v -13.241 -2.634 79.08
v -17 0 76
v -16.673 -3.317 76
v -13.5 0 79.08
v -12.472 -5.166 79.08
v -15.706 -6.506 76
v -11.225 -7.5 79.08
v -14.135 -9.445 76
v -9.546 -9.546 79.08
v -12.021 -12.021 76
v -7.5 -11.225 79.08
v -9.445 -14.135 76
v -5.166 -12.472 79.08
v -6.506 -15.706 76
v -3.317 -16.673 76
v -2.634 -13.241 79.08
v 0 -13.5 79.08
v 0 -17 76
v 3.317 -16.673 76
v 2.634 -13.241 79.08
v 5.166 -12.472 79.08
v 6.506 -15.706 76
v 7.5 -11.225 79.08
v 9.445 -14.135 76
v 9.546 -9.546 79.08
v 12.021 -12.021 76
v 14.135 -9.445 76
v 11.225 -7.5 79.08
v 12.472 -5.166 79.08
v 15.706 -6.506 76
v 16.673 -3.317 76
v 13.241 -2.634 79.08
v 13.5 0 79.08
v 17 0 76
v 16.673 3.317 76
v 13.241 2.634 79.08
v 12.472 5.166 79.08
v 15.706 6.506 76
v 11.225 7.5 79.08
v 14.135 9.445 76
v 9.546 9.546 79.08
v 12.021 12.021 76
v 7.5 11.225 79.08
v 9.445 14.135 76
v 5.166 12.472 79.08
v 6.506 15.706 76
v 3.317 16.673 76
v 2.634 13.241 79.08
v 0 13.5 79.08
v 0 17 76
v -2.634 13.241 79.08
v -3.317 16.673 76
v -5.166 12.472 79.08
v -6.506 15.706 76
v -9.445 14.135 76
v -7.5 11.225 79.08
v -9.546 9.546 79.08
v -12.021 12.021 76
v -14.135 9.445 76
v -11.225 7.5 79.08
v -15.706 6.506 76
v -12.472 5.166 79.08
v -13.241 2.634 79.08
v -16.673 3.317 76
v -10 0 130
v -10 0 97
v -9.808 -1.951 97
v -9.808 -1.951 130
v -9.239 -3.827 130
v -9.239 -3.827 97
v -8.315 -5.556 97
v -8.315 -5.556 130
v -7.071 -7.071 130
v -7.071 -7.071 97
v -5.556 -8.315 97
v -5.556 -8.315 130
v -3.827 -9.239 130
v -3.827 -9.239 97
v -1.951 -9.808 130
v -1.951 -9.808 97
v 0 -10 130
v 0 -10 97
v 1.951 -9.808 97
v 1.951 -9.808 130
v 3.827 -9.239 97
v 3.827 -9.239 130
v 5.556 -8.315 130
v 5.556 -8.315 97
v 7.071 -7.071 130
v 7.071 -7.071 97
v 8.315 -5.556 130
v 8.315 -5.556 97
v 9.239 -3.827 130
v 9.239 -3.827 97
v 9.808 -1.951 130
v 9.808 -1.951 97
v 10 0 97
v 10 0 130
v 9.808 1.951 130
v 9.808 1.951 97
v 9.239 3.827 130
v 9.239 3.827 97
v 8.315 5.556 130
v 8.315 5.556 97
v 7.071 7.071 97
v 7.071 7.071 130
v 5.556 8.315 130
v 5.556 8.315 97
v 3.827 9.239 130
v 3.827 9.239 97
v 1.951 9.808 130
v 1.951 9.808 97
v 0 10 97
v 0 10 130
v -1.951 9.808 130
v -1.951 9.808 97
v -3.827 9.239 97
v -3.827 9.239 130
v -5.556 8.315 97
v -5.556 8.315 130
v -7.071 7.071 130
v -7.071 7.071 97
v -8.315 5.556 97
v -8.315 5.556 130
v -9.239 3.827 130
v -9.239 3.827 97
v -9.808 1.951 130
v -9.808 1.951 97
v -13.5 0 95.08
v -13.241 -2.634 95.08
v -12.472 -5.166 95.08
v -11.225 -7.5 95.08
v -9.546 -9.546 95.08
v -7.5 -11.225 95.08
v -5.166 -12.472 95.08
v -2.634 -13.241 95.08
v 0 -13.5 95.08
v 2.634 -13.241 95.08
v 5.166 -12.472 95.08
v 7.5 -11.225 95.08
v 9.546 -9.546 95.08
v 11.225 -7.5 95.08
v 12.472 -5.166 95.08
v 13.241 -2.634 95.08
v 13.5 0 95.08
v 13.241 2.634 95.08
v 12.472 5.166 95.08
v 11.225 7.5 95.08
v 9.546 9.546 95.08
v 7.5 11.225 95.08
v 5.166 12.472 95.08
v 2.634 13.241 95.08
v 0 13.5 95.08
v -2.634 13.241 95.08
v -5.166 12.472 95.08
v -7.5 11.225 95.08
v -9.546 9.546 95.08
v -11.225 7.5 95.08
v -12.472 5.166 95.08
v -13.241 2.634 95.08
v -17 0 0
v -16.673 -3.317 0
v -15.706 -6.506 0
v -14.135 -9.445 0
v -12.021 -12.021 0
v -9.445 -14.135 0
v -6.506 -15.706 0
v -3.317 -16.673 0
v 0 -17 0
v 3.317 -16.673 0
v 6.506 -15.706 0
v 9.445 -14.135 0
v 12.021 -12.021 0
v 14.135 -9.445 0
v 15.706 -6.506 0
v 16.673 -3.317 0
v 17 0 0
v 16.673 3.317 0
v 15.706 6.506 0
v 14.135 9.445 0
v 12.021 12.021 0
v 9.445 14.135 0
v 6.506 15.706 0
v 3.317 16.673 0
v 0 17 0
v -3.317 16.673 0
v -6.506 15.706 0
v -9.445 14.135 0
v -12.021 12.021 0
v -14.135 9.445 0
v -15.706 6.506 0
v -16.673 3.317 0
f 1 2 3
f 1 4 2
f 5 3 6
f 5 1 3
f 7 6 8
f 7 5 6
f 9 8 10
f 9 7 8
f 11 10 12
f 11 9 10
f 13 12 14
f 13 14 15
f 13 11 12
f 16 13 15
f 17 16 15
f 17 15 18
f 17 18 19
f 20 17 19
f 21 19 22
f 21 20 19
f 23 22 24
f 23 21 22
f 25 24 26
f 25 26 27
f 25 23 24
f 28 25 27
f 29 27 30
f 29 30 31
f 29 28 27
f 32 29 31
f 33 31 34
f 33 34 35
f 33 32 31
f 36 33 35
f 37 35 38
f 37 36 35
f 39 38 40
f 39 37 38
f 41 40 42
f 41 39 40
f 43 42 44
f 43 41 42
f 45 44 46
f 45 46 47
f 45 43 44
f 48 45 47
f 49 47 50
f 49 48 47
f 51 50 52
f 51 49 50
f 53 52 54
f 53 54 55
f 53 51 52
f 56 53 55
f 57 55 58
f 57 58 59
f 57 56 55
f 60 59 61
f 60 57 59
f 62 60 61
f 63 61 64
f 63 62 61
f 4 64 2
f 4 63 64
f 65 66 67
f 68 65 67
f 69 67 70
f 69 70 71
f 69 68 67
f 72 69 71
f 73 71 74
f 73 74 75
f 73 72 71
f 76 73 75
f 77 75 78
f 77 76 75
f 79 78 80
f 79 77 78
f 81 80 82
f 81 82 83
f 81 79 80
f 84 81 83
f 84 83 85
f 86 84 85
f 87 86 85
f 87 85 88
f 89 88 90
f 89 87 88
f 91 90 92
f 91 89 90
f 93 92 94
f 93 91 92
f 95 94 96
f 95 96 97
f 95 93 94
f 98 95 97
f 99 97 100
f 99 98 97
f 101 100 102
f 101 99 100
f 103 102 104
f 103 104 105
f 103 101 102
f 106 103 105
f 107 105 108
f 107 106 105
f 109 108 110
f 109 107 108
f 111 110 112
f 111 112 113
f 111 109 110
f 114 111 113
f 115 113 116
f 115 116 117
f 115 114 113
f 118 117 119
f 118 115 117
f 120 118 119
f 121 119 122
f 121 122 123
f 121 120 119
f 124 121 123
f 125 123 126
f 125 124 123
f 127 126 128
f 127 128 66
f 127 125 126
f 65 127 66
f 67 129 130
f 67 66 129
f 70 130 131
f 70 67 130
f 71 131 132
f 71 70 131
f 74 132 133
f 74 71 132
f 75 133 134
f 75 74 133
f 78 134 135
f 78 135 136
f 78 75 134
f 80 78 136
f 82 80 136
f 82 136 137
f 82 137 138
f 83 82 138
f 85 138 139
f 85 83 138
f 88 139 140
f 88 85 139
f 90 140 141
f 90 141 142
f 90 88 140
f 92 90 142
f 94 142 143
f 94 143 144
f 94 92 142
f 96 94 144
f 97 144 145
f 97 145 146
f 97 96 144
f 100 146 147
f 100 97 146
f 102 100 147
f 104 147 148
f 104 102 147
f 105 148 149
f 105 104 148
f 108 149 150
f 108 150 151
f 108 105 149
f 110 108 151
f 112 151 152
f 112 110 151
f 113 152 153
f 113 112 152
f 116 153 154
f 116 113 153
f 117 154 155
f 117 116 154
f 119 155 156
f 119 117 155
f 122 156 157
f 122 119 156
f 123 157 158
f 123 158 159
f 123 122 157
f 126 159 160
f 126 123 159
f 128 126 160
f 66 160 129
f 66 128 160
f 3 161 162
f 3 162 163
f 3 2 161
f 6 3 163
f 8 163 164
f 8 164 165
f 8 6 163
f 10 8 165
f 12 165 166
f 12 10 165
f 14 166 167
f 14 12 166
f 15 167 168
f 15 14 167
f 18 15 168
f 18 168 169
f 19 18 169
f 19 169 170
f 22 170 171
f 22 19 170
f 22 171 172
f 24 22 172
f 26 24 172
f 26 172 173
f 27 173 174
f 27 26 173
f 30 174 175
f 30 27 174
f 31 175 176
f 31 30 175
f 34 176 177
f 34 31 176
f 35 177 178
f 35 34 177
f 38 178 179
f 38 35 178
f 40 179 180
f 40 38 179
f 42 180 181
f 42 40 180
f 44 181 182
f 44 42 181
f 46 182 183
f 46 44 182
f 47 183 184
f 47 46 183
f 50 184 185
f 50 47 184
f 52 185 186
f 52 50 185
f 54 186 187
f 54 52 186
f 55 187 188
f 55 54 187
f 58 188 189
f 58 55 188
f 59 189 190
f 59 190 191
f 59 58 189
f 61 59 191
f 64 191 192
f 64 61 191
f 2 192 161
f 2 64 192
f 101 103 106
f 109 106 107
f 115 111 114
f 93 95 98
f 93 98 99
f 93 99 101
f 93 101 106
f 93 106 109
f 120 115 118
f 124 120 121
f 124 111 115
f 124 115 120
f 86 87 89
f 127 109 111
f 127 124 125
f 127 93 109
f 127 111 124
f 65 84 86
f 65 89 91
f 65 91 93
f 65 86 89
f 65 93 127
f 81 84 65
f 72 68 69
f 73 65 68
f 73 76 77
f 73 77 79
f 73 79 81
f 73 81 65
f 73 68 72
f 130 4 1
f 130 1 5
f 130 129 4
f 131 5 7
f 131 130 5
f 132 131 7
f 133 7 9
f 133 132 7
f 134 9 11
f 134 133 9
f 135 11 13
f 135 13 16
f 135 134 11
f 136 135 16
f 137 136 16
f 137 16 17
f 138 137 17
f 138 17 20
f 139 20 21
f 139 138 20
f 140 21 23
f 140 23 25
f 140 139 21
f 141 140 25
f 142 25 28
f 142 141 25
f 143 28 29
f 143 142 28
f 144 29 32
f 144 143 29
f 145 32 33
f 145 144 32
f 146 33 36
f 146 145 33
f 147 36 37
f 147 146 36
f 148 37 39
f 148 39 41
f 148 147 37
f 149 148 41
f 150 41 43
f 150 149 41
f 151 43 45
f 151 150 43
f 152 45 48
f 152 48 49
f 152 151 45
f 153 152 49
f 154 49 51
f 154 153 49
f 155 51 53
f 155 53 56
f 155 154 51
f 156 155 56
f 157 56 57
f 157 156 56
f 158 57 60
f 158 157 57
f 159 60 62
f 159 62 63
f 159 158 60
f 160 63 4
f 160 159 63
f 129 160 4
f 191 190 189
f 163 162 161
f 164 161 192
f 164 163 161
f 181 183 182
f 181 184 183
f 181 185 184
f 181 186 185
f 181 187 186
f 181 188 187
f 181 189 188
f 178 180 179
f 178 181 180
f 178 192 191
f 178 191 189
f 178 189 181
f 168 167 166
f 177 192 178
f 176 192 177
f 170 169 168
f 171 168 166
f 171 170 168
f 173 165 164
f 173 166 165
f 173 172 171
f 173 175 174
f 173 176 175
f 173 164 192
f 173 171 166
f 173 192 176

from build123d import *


with BuildPart() as part:
    # Sketch → Revolution (revolve)
    with BuildSketch(Plane.XZ):
        Polygon((0, 0), (-17, 0), (-17, 76), (-13.5, 79.08), (-13.5, 95.08), (-10, 97), (-10, 130), (0, 130), align=None)
    revolve(axis=Axis((0, 0, 0), (0, 0, 1)))


solid = part.part
